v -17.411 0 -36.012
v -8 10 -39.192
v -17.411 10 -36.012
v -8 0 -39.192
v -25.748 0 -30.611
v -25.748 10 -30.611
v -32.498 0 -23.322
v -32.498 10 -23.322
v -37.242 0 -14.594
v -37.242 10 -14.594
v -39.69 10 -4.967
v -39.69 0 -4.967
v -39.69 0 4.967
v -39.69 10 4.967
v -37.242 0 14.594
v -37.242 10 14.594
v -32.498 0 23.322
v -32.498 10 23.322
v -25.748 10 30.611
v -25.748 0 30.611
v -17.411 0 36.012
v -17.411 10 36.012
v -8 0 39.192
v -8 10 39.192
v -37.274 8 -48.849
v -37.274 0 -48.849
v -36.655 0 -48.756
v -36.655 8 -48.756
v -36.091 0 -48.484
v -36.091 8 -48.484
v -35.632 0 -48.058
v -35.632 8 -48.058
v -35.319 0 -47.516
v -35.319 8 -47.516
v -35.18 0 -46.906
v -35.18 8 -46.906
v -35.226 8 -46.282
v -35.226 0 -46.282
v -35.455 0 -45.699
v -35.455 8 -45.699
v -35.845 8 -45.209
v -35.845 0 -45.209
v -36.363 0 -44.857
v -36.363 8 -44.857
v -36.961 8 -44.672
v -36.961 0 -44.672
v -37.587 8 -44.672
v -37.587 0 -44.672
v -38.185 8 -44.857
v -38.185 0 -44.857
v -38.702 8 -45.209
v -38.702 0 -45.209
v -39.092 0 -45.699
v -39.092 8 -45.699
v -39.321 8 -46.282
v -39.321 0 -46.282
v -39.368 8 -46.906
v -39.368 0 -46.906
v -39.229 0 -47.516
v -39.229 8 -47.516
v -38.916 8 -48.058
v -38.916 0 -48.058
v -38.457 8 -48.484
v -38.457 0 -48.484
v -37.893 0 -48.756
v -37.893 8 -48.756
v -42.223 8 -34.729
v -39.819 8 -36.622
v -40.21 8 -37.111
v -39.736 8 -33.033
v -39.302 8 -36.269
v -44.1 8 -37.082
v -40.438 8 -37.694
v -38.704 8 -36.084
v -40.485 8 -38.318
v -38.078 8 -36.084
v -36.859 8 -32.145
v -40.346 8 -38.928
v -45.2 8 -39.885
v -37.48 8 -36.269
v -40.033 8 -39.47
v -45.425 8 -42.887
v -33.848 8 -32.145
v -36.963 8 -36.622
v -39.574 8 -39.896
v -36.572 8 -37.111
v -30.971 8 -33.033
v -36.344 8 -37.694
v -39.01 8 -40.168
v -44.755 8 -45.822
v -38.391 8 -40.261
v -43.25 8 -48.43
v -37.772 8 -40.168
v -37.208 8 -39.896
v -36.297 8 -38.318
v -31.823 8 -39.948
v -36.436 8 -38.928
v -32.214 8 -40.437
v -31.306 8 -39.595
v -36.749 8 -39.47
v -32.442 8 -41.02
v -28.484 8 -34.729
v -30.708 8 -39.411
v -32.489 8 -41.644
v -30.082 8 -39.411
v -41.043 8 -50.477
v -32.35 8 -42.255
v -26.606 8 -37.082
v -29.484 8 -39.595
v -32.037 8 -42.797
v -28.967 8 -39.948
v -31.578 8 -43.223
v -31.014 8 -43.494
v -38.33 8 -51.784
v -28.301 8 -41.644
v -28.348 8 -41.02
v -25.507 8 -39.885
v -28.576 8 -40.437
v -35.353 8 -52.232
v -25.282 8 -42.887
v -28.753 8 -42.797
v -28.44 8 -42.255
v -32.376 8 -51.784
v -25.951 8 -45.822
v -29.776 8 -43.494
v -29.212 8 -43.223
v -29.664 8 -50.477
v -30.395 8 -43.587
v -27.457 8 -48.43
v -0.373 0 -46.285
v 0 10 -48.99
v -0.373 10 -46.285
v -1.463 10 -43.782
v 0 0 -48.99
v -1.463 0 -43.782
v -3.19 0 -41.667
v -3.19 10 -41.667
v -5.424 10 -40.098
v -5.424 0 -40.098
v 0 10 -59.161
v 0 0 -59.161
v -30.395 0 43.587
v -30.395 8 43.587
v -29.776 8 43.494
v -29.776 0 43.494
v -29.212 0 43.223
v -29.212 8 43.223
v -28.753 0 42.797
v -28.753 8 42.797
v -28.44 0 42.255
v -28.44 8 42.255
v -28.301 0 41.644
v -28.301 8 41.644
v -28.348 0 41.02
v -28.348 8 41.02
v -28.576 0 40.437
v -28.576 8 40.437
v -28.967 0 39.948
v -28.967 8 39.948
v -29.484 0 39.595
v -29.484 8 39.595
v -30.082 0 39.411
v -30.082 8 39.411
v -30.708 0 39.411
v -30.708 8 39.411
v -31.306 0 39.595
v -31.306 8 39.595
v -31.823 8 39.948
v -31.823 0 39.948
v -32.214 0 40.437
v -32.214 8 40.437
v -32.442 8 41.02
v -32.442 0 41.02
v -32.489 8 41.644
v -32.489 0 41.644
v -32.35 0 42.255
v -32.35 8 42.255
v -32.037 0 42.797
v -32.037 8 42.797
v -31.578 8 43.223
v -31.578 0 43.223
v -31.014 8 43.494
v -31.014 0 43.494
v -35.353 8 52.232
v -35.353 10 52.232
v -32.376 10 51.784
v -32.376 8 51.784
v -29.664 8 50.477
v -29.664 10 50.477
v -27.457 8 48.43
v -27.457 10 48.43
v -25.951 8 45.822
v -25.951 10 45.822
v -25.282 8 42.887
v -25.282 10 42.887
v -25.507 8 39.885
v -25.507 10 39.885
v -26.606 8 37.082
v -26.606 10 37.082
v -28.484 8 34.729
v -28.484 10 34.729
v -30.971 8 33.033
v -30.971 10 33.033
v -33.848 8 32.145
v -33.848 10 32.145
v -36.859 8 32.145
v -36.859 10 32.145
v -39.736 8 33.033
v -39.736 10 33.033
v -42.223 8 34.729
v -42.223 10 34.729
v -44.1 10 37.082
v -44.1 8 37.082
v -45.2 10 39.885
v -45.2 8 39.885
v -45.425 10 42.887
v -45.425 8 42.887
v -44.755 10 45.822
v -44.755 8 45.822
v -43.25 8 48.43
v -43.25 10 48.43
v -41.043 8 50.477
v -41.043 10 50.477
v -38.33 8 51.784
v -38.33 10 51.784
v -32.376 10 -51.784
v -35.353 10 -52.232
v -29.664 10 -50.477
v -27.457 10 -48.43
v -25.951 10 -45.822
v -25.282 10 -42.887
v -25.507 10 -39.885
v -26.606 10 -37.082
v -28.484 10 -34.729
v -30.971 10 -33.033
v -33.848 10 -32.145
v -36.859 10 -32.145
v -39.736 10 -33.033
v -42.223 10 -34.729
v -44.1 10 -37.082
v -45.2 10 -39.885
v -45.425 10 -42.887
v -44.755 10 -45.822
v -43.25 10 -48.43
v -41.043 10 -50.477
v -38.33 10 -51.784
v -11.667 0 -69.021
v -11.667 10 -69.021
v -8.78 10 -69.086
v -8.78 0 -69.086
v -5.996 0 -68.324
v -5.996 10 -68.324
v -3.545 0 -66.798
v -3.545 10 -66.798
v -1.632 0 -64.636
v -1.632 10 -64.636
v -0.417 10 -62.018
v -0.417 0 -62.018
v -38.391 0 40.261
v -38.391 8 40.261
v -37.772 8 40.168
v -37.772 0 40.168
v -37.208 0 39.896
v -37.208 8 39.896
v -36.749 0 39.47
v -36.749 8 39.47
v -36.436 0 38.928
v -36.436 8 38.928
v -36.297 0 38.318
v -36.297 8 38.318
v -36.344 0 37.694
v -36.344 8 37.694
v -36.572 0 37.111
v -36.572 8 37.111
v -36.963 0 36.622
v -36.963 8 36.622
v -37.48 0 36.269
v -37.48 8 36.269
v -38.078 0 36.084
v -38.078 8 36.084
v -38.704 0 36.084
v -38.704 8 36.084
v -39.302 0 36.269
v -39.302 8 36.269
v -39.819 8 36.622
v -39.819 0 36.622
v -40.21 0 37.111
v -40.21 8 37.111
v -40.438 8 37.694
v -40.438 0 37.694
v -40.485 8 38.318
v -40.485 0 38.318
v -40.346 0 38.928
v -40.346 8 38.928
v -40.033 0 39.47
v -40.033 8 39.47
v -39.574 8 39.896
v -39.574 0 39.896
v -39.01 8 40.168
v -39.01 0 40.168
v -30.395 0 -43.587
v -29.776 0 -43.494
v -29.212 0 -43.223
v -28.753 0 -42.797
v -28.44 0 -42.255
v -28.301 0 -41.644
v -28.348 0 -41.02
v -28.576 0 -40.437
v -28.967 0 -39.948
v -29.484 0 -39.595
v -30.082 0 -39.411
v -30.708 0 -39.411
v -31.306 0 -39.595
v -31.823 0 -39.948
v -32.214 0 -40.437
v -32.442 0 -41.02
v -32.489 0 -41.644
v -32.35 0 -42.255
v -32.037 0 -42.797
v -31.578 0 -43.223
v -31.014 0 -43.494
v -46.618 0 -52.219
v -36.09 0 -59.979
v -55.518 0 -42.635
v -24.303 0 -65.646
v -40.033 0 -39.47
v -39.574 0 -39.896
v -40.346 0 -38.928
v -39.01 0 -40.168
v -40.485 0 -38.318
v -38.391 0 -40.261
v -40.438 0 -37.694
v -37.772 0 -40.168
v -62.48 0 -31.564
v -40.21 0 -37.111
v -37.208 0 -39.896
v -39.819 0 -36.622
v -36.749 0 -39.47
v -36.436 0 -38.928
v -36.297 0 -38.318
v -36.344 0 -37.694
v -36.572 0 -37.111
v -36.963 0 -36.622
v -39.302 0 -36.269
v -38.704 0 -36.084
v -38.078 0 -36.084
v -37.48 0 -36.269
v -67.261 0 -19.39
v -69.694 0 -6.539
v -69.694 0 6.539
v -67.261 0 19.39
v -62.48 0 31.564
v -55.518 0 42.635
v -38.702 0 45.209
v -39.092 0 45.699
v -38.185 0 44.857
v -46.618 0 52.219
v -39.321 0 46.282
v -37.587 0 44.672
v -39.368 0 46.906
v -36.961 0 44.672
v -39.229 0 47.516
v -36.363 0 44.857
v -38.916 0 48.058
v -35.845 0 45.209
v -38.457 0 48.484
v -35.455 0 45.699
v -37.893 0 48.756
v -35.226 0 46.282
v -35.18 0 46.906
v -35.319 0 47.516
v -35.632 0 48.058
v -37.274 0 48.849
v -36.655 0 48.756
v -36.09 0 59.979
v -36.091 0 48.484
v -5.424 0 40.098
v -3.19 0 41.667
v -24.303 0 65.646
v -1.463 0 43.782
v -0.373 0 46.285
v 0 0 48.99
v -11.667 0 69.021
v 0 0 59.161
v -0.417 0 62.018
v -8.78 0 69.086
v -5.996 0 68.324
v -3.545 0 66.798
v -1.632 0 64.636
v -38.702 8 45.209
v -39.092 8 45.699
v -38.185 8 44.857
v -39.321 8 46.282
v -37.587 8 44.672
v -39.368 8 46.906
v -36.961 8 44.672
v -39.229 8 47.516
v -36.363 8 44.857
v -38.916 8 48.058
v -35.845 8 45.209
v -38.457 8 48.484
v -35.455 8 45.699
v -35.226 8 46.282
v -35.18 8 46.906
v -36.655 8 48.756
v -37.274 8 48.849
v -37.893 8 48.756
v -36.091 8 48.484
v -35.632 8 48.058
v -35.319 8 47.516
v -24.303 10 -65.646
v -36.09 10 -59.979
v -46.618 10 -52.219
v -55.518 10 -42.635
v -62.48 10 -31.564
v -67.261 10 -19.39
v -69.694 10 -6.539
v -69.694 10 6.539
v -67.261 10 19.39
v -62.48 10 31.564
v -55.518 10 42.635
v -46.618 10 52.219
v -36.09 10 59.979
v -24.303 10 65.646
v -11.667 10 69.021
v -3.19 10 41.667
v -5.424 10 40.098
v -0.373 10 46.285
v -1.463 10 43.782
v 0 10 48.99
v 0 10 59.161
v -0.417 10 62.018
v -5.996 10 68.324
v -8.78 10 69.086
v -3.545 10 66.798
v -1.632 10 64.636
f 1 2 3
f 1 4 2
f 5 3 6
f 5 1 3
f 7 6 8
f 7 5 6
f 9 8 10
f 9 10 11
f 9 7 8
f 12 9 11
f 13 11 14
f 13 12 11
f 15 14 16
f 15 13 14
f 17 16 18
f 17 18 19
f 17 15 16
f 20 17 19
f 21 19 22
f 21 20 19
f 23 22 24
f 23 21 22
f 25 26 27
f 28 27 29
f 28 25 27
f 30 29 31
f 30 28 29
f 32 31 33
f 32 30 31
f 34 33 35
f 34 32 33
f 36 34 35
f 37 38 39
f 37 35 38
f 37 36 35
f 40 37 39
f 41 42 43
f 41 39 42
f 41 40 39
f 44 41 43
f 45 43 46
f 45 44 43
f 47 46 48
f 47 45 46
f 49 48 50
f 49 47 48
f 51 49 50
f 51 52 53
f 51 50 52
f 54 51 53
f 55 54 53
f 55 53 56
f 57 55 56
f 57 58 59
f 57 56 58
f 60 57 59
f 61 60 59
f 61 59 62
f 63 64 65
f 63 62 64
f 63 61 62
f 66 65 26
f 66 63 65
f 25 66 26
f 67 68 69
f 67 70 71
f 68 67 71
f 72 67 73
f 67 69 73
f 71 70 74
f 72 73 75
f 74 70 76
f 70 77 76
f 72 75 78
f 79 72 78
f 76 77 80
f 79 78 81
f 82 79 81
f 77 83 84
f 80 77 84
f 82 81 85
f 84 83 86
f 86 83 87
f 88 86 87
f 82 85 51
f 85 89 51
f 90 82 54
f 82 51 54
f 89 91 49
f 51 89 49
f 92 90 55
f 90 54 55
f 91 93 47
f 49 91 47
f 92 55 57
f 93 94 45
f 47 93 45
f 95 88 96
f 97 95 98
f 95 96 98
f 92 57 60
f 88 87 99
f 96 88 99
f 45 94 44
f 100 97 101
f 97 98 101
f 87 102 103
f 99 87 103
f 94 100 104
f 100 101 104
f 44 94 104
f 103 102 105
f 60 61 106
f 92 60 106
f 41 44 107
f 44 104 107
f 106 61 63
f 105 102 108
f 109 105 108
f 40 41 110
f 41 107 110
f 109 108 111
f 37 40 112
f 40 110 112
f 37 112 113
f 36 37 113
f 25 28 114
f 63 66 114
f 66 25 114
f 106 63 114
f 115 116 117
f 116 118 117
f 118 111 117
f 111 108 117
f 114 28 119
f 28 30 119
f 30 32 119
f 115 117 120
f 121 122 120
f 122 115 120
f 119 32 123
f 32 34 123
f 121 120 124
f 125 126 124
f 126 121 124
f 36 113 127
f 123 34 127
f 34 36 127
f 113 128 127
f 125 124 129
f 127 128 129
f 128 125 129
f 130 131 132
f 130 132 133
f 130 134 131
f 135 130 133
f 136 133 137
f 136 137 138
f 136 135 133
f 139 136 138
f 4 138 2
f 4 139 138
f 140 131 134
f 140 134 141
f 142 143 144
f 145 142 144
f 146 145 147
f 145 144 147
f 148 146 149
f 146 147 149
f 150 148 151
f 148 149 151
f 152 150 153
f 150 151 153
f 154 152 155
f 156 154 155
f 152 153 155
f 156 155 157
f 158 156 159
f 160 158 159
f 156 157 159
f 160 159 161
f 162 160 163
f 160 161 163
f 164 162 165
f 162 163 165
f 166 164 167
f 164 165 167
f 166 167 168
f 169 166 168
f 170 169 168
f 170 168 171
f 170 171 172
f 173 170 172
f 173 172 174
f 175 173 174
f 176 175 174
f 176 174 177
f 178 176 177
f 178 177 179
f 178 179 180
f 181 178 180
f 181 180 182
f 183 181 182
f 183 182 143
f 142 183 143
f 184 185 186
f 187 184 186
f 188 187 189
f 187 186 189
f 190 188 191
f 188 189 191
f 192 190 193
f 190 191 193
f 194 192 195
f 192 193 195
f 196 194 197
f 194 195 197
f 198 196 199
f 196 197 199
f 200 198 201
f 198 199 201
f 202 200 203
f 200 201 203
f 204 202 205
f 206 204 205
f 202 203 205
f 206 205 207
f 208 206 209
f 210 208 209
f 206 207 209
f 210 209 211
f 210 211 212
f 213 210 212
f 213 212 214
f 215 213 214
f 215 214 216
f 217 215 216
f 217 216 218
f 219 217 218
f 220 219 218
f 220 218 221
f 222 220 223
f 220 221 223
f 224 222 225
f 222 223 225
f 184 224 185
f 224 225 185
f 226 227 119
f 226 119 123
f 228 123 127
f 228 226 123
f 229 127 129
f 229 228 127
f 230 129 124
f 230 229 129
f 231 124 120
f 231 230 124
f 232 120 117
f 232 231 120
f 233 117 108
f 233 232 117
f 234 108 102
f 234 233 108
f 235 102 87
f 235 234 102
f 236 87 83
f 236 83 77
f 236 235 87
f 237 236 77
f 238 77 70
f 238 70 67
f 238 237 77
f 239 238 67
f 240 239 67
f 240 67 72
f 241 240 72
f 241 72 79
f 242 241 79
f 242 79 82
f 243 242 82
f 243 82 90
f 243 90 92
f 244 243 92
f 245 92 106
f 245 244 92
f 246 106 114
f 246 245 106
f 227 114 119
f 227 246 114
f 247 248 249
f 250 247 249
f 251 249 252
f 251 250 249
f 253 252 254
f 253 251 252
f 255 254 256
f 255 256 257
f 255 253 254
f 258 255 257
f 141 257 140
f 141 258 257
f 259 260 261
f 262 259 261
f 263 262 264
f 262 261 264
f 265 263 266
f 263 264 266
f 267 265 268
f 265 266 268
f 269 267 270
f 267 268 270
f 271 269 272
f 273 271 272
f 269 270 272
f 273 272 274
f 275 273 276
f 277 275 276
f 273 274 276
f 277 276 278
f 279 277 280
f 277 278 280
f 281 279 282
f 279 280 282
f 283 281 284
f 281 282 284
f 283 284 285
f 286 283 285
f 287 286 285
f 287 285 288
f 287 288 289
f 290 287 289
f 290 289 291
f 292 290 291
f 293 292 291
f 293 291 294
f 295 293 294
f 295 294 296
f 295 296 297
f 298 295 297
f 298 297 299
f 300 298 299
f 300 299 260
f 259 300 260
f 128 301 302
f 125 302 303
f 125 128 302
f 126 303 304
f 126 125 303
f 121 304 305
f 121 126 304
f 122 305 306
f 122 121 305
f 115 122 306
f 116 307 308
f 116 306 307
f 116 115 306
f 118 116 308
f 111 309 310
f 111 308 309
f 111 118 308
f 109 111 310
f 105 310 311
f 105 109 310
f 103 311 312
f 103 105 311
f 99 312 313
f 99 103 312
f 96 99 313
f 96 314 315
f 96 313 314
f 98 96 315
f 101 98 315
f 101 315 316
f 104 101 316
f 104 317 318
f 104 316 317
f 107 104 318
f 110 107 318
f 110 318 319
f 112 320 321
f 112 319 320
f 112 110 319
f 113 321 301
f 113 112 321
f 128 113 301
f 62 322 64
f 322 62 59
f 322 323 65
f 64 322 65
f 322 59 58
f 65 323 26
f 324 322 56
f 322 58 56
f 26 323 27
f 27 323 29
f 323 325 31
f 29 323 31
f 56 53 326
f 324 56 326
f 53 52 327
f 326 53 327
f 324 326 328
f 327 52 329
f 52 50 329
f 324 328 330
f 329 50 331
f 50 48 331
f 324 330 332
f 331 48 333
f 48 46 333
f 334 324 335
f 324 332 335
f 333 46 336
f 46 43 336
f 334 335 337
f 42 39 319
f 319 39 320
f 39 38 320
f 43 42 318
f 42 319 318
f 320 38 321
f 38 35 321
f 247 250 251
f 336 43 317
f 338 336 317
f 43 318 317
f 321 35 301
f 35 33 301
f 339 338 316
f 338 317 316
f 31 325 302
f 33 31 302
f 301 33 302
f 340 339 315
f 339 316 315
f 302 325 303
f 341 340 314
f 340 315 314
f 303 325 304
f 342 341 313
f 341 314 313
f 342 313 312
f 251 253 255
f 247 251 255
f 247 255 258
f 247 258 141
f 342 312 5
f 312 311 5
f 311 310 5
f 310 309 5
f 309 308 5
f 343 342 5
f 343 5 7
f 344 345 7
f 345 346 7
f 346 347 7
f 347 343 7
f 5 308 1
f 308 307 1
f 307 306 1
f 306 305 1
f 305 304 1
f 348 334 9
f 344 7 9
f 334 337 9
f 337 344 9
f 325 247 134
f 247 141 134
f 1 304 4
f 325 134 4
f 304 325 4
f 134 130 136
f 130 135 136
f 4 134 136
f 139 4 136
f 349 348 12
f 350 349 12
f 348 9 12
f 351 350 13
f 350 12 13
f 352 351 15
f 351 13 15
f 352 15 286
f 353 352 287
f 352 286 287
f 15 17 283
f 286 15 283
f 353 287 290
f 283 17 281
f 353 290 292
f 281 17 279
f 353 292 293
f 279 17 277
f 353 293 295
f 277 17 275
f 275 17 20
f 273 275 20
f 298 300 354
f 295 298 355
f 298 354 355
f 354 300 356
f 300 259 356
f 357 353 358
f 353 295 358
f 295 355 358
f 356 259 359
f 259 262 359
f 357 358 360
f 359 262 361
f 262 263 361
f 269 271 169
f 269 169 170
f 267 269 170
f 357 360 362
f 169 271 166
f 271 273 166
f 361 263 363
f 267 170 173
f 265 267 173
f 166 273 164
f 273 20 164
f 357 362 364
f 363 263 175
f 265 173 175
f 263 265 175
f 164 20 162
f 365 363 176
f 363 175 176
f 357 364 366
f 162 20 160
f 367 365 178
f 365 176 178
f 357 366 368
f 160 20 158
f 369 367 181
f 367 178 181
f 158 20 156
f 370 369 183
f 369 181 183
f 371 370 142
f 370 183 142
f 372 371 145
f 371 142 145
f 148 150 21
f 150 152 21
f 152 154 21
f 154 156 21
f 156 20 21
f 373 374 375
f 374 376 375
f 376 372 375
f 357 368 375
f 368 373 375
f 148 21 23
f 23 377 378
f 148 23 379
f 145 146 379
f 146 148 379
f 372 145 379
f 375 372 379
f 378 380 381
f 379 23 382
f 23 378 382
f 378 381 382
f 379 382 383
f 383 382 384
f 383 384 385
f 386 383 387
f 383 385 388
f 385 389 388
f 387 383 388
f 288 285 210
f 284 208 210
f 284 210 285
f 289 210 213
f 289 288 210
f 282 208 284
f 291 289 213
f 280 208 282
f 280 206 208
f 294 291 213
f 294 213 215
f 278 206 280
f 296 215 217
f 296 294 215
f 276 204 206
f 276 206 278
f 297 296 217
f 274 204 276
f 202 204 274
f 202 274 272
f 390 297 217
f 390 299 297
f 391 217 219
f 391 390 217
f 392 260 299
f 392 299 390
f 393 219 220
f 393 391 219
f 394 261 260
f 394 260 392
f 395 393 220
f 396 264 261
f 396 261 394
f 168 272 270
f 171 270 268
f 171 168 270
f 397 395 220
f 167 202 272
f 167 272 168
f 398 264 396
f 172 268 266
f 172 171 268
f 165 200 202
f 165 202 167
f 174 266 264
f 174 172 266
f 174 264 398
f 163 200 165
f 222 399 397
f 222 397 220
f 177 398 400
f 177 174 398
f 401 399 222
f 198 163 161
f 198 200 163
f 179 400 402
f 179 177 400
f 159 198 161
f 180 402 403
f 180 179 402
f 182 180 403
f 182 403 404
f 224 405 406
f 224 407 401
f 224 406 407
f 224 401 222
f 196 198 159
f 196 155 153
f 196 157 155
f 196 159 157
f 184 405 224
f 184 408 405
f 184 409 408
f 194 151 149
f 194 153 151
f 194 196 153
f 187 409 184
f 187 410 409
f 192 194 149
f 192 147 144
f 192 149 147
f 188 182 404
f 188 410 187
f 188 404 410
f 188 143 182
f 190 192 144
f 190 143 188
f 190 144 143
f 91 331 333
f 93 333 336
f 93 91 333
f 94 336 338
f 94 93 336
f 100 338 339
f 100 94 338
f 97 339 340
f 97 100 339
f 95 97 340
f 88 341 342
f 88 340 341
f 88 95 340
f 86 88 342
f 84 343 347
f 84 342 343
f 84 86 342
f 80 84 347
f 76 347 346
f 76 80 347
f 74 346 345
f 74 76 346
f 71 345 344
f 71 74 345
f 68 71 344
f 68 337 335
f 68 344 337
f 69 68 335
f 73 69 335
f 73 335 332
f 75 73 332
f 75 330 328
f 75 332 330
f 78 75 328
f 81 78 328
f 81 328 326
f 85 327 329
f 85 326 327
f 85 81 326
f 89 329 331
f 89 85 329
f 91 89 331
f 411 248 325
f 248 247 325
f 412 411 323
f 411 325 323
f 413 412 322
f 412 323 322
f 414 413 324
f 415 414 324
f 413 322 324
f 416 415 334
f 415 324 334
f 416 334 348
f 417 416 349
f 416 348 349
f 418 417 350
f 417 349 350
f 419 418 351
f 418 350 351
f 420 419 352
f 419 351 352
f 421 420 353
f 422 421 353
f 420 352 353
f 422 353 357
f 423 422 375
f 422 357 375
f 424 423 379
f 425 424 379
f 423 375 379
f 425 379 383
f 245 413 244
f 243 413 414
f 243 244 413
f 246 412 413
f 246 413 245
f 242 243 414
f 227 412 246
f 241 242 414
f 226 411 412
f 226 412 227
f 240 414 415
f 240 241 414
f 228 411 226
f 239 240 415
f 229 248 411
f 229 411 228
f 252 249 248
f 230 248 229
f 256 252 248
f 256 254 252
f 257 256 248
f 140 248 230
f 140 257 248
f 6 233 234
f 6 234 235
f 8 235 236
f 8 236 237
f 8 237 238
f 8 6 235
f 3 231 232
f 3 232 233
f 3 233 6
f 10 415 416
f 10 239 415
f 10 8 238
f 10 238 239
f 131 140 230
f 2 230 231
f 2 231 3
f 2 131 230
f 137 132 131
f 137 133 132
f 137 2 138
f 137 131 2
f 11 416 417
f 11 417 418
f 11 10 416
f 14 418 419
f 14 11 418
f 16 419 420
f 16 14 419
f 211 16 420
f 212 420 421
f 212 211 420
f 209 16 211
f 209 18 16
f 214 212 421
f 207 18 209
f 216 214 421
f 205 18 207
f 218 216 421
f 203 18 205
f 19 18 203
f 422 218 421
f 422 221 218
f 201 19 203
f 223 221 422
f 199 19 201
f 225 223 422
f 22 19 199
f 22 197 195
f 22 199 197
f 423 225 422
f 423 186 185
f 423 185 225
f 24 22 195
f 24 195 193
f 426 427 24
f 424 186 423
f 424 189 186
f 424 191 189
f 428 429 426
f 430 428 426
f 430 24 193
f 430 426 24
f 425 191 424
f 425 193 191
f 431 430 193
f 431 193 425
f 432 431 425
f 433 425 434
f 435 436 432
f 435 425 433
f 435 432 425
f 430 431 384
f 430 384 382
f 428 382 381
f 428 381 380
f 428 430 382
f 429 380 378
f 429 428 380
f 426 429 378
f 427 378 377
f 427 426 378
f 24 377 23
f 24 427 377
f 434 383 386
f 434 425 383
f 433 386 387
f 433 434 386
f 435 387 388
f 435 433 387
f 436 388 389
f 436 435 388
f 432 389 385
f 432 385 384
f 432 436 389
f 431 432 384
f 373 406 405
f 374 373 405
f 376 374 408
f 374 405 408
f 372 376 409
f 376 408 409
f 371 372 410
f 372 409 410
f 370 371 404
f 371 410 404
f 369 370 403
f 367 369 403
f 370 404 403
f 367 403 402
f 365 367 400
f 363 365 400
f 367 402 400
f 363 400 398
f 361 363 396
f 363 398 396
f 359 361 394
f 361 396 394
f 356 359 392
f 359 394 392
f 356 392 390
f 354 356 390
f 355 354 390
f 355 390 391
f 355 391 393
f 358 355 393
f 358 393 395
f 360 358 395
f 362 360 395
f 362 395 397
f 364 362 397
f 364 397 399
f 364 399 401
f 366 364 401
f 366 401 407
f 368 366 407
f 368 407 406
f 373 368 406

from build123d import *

# Parameters (mm, degrees)
SKETCH_1_R          = 70
SKETCH_1_R_2        = 40
EXTRUDE_1_DEPTH     = 10
SKETCH_2_W          = 120.331390639
SKETCH_2_H          = 328.028138093
CUT_EXTRUDE_1_DEPTH = 62
SKETCH_3_R          = 10.1
CUT_EXTRUDE_2_DEPTH = 2
FILLET_1_R          = 10
SKETCH_4_R          = 2.1
CUT_EXTRUDE_3_DEPTH = 10


with BuildPart() as part:
    # 草图1 → 凸台-拉伸1 (new body)
    with BuildSketch(Plane(origin=(0, 0, 0), x_dir=(1, 0, 0), z_dir=(0, 1, 0))):
        with Locations(Location((0, 0, 0), (0, 0, 270))):
            Circle(SKETCH_1_R)
        with Locations(Location((0, 0, 0), (0, 0, 270))):
            Circle(SKETCH_1_R_2, mode=Mode.SUBTRACT)
    extrude(amount=EXTRUDE_1_DEPTH)

    # 草图2 → 切除-拉伸1 (cut)
    with BuildSketch(Plane(origin=(0, 10, 0), x_dir=(1, 0, 0), z_dir=(0, 1, 0))):
        with Locations((60.16569532, 8.487402818)):
            Rectangle(SKETCH_2_W, SKETCH_2_H)
    extrude(amount=-CUT_EXTRUDE_1_DEPTH, mode=Mode.SUBTRACT)

    # 草图3 → 切除-拉伸2 (cut)
    with BuildSketch(Plane(origin=(0, 10, 0), x_dir=(1, 0, 0), z_dir=(0, 1, 0))):
        with Locations(Location((-35.353318533, -42.132444372, 0), (0, 0, 270))):
            Circle(SKETCH_3_R)
    cut_extrude_2 = extrude(amount=-CUT_EXTRUDE_2_DEPTH, mode=Mode.SUBTRACT)

    # 镜向1: 切除-拉伸2 across plane
    add(cut_extrude_2.mirror(Plane.XY), mode=Mode.SUBTRACT)

    # 圆角1
    fillet_1_edges = [part.edges().sort_by_distance(p)[0] for p in [
        (0, 5, 40),
        (0, 5, -40),
        (0, 5, -70),
        (0, 5, 70),
    ]]
    fillet(fillet_1_edges, radius=FILLET_1_R)

    # 草图4 → 切除-拉伸3 (cut)
    with BuildSketch(Plane(origin=(0, 8, 0), x_dir=(1, 0, 0), z_dir=(0, 1, 0))):
        with Locations(Location((-38.391050289, -38.161023243, 0), (0, 0, 270))):
            Circle(SKETCH_4_R)
        with Locations(Location((-30.395101069, -41.487402065, 0), (0, 0, 270))):
            Circle(SKETCH_4_R)
        with Locations(Location((-37.273804241, -46.748907806, 0), (0, 0, 270))):
            Circle(SKETCH_4_R)
    cut_extrude_3 = extrude(amount=-CUT_EXTRUDE_3_DEPTH, mode=Mode.SUBTRACT)

    # 镜向2: 切除-拉伸3 across plane
    add(cut_extrude_3.mirror(Plane.XY), mode=Mode.SUBTRACT)


solid = part.part
